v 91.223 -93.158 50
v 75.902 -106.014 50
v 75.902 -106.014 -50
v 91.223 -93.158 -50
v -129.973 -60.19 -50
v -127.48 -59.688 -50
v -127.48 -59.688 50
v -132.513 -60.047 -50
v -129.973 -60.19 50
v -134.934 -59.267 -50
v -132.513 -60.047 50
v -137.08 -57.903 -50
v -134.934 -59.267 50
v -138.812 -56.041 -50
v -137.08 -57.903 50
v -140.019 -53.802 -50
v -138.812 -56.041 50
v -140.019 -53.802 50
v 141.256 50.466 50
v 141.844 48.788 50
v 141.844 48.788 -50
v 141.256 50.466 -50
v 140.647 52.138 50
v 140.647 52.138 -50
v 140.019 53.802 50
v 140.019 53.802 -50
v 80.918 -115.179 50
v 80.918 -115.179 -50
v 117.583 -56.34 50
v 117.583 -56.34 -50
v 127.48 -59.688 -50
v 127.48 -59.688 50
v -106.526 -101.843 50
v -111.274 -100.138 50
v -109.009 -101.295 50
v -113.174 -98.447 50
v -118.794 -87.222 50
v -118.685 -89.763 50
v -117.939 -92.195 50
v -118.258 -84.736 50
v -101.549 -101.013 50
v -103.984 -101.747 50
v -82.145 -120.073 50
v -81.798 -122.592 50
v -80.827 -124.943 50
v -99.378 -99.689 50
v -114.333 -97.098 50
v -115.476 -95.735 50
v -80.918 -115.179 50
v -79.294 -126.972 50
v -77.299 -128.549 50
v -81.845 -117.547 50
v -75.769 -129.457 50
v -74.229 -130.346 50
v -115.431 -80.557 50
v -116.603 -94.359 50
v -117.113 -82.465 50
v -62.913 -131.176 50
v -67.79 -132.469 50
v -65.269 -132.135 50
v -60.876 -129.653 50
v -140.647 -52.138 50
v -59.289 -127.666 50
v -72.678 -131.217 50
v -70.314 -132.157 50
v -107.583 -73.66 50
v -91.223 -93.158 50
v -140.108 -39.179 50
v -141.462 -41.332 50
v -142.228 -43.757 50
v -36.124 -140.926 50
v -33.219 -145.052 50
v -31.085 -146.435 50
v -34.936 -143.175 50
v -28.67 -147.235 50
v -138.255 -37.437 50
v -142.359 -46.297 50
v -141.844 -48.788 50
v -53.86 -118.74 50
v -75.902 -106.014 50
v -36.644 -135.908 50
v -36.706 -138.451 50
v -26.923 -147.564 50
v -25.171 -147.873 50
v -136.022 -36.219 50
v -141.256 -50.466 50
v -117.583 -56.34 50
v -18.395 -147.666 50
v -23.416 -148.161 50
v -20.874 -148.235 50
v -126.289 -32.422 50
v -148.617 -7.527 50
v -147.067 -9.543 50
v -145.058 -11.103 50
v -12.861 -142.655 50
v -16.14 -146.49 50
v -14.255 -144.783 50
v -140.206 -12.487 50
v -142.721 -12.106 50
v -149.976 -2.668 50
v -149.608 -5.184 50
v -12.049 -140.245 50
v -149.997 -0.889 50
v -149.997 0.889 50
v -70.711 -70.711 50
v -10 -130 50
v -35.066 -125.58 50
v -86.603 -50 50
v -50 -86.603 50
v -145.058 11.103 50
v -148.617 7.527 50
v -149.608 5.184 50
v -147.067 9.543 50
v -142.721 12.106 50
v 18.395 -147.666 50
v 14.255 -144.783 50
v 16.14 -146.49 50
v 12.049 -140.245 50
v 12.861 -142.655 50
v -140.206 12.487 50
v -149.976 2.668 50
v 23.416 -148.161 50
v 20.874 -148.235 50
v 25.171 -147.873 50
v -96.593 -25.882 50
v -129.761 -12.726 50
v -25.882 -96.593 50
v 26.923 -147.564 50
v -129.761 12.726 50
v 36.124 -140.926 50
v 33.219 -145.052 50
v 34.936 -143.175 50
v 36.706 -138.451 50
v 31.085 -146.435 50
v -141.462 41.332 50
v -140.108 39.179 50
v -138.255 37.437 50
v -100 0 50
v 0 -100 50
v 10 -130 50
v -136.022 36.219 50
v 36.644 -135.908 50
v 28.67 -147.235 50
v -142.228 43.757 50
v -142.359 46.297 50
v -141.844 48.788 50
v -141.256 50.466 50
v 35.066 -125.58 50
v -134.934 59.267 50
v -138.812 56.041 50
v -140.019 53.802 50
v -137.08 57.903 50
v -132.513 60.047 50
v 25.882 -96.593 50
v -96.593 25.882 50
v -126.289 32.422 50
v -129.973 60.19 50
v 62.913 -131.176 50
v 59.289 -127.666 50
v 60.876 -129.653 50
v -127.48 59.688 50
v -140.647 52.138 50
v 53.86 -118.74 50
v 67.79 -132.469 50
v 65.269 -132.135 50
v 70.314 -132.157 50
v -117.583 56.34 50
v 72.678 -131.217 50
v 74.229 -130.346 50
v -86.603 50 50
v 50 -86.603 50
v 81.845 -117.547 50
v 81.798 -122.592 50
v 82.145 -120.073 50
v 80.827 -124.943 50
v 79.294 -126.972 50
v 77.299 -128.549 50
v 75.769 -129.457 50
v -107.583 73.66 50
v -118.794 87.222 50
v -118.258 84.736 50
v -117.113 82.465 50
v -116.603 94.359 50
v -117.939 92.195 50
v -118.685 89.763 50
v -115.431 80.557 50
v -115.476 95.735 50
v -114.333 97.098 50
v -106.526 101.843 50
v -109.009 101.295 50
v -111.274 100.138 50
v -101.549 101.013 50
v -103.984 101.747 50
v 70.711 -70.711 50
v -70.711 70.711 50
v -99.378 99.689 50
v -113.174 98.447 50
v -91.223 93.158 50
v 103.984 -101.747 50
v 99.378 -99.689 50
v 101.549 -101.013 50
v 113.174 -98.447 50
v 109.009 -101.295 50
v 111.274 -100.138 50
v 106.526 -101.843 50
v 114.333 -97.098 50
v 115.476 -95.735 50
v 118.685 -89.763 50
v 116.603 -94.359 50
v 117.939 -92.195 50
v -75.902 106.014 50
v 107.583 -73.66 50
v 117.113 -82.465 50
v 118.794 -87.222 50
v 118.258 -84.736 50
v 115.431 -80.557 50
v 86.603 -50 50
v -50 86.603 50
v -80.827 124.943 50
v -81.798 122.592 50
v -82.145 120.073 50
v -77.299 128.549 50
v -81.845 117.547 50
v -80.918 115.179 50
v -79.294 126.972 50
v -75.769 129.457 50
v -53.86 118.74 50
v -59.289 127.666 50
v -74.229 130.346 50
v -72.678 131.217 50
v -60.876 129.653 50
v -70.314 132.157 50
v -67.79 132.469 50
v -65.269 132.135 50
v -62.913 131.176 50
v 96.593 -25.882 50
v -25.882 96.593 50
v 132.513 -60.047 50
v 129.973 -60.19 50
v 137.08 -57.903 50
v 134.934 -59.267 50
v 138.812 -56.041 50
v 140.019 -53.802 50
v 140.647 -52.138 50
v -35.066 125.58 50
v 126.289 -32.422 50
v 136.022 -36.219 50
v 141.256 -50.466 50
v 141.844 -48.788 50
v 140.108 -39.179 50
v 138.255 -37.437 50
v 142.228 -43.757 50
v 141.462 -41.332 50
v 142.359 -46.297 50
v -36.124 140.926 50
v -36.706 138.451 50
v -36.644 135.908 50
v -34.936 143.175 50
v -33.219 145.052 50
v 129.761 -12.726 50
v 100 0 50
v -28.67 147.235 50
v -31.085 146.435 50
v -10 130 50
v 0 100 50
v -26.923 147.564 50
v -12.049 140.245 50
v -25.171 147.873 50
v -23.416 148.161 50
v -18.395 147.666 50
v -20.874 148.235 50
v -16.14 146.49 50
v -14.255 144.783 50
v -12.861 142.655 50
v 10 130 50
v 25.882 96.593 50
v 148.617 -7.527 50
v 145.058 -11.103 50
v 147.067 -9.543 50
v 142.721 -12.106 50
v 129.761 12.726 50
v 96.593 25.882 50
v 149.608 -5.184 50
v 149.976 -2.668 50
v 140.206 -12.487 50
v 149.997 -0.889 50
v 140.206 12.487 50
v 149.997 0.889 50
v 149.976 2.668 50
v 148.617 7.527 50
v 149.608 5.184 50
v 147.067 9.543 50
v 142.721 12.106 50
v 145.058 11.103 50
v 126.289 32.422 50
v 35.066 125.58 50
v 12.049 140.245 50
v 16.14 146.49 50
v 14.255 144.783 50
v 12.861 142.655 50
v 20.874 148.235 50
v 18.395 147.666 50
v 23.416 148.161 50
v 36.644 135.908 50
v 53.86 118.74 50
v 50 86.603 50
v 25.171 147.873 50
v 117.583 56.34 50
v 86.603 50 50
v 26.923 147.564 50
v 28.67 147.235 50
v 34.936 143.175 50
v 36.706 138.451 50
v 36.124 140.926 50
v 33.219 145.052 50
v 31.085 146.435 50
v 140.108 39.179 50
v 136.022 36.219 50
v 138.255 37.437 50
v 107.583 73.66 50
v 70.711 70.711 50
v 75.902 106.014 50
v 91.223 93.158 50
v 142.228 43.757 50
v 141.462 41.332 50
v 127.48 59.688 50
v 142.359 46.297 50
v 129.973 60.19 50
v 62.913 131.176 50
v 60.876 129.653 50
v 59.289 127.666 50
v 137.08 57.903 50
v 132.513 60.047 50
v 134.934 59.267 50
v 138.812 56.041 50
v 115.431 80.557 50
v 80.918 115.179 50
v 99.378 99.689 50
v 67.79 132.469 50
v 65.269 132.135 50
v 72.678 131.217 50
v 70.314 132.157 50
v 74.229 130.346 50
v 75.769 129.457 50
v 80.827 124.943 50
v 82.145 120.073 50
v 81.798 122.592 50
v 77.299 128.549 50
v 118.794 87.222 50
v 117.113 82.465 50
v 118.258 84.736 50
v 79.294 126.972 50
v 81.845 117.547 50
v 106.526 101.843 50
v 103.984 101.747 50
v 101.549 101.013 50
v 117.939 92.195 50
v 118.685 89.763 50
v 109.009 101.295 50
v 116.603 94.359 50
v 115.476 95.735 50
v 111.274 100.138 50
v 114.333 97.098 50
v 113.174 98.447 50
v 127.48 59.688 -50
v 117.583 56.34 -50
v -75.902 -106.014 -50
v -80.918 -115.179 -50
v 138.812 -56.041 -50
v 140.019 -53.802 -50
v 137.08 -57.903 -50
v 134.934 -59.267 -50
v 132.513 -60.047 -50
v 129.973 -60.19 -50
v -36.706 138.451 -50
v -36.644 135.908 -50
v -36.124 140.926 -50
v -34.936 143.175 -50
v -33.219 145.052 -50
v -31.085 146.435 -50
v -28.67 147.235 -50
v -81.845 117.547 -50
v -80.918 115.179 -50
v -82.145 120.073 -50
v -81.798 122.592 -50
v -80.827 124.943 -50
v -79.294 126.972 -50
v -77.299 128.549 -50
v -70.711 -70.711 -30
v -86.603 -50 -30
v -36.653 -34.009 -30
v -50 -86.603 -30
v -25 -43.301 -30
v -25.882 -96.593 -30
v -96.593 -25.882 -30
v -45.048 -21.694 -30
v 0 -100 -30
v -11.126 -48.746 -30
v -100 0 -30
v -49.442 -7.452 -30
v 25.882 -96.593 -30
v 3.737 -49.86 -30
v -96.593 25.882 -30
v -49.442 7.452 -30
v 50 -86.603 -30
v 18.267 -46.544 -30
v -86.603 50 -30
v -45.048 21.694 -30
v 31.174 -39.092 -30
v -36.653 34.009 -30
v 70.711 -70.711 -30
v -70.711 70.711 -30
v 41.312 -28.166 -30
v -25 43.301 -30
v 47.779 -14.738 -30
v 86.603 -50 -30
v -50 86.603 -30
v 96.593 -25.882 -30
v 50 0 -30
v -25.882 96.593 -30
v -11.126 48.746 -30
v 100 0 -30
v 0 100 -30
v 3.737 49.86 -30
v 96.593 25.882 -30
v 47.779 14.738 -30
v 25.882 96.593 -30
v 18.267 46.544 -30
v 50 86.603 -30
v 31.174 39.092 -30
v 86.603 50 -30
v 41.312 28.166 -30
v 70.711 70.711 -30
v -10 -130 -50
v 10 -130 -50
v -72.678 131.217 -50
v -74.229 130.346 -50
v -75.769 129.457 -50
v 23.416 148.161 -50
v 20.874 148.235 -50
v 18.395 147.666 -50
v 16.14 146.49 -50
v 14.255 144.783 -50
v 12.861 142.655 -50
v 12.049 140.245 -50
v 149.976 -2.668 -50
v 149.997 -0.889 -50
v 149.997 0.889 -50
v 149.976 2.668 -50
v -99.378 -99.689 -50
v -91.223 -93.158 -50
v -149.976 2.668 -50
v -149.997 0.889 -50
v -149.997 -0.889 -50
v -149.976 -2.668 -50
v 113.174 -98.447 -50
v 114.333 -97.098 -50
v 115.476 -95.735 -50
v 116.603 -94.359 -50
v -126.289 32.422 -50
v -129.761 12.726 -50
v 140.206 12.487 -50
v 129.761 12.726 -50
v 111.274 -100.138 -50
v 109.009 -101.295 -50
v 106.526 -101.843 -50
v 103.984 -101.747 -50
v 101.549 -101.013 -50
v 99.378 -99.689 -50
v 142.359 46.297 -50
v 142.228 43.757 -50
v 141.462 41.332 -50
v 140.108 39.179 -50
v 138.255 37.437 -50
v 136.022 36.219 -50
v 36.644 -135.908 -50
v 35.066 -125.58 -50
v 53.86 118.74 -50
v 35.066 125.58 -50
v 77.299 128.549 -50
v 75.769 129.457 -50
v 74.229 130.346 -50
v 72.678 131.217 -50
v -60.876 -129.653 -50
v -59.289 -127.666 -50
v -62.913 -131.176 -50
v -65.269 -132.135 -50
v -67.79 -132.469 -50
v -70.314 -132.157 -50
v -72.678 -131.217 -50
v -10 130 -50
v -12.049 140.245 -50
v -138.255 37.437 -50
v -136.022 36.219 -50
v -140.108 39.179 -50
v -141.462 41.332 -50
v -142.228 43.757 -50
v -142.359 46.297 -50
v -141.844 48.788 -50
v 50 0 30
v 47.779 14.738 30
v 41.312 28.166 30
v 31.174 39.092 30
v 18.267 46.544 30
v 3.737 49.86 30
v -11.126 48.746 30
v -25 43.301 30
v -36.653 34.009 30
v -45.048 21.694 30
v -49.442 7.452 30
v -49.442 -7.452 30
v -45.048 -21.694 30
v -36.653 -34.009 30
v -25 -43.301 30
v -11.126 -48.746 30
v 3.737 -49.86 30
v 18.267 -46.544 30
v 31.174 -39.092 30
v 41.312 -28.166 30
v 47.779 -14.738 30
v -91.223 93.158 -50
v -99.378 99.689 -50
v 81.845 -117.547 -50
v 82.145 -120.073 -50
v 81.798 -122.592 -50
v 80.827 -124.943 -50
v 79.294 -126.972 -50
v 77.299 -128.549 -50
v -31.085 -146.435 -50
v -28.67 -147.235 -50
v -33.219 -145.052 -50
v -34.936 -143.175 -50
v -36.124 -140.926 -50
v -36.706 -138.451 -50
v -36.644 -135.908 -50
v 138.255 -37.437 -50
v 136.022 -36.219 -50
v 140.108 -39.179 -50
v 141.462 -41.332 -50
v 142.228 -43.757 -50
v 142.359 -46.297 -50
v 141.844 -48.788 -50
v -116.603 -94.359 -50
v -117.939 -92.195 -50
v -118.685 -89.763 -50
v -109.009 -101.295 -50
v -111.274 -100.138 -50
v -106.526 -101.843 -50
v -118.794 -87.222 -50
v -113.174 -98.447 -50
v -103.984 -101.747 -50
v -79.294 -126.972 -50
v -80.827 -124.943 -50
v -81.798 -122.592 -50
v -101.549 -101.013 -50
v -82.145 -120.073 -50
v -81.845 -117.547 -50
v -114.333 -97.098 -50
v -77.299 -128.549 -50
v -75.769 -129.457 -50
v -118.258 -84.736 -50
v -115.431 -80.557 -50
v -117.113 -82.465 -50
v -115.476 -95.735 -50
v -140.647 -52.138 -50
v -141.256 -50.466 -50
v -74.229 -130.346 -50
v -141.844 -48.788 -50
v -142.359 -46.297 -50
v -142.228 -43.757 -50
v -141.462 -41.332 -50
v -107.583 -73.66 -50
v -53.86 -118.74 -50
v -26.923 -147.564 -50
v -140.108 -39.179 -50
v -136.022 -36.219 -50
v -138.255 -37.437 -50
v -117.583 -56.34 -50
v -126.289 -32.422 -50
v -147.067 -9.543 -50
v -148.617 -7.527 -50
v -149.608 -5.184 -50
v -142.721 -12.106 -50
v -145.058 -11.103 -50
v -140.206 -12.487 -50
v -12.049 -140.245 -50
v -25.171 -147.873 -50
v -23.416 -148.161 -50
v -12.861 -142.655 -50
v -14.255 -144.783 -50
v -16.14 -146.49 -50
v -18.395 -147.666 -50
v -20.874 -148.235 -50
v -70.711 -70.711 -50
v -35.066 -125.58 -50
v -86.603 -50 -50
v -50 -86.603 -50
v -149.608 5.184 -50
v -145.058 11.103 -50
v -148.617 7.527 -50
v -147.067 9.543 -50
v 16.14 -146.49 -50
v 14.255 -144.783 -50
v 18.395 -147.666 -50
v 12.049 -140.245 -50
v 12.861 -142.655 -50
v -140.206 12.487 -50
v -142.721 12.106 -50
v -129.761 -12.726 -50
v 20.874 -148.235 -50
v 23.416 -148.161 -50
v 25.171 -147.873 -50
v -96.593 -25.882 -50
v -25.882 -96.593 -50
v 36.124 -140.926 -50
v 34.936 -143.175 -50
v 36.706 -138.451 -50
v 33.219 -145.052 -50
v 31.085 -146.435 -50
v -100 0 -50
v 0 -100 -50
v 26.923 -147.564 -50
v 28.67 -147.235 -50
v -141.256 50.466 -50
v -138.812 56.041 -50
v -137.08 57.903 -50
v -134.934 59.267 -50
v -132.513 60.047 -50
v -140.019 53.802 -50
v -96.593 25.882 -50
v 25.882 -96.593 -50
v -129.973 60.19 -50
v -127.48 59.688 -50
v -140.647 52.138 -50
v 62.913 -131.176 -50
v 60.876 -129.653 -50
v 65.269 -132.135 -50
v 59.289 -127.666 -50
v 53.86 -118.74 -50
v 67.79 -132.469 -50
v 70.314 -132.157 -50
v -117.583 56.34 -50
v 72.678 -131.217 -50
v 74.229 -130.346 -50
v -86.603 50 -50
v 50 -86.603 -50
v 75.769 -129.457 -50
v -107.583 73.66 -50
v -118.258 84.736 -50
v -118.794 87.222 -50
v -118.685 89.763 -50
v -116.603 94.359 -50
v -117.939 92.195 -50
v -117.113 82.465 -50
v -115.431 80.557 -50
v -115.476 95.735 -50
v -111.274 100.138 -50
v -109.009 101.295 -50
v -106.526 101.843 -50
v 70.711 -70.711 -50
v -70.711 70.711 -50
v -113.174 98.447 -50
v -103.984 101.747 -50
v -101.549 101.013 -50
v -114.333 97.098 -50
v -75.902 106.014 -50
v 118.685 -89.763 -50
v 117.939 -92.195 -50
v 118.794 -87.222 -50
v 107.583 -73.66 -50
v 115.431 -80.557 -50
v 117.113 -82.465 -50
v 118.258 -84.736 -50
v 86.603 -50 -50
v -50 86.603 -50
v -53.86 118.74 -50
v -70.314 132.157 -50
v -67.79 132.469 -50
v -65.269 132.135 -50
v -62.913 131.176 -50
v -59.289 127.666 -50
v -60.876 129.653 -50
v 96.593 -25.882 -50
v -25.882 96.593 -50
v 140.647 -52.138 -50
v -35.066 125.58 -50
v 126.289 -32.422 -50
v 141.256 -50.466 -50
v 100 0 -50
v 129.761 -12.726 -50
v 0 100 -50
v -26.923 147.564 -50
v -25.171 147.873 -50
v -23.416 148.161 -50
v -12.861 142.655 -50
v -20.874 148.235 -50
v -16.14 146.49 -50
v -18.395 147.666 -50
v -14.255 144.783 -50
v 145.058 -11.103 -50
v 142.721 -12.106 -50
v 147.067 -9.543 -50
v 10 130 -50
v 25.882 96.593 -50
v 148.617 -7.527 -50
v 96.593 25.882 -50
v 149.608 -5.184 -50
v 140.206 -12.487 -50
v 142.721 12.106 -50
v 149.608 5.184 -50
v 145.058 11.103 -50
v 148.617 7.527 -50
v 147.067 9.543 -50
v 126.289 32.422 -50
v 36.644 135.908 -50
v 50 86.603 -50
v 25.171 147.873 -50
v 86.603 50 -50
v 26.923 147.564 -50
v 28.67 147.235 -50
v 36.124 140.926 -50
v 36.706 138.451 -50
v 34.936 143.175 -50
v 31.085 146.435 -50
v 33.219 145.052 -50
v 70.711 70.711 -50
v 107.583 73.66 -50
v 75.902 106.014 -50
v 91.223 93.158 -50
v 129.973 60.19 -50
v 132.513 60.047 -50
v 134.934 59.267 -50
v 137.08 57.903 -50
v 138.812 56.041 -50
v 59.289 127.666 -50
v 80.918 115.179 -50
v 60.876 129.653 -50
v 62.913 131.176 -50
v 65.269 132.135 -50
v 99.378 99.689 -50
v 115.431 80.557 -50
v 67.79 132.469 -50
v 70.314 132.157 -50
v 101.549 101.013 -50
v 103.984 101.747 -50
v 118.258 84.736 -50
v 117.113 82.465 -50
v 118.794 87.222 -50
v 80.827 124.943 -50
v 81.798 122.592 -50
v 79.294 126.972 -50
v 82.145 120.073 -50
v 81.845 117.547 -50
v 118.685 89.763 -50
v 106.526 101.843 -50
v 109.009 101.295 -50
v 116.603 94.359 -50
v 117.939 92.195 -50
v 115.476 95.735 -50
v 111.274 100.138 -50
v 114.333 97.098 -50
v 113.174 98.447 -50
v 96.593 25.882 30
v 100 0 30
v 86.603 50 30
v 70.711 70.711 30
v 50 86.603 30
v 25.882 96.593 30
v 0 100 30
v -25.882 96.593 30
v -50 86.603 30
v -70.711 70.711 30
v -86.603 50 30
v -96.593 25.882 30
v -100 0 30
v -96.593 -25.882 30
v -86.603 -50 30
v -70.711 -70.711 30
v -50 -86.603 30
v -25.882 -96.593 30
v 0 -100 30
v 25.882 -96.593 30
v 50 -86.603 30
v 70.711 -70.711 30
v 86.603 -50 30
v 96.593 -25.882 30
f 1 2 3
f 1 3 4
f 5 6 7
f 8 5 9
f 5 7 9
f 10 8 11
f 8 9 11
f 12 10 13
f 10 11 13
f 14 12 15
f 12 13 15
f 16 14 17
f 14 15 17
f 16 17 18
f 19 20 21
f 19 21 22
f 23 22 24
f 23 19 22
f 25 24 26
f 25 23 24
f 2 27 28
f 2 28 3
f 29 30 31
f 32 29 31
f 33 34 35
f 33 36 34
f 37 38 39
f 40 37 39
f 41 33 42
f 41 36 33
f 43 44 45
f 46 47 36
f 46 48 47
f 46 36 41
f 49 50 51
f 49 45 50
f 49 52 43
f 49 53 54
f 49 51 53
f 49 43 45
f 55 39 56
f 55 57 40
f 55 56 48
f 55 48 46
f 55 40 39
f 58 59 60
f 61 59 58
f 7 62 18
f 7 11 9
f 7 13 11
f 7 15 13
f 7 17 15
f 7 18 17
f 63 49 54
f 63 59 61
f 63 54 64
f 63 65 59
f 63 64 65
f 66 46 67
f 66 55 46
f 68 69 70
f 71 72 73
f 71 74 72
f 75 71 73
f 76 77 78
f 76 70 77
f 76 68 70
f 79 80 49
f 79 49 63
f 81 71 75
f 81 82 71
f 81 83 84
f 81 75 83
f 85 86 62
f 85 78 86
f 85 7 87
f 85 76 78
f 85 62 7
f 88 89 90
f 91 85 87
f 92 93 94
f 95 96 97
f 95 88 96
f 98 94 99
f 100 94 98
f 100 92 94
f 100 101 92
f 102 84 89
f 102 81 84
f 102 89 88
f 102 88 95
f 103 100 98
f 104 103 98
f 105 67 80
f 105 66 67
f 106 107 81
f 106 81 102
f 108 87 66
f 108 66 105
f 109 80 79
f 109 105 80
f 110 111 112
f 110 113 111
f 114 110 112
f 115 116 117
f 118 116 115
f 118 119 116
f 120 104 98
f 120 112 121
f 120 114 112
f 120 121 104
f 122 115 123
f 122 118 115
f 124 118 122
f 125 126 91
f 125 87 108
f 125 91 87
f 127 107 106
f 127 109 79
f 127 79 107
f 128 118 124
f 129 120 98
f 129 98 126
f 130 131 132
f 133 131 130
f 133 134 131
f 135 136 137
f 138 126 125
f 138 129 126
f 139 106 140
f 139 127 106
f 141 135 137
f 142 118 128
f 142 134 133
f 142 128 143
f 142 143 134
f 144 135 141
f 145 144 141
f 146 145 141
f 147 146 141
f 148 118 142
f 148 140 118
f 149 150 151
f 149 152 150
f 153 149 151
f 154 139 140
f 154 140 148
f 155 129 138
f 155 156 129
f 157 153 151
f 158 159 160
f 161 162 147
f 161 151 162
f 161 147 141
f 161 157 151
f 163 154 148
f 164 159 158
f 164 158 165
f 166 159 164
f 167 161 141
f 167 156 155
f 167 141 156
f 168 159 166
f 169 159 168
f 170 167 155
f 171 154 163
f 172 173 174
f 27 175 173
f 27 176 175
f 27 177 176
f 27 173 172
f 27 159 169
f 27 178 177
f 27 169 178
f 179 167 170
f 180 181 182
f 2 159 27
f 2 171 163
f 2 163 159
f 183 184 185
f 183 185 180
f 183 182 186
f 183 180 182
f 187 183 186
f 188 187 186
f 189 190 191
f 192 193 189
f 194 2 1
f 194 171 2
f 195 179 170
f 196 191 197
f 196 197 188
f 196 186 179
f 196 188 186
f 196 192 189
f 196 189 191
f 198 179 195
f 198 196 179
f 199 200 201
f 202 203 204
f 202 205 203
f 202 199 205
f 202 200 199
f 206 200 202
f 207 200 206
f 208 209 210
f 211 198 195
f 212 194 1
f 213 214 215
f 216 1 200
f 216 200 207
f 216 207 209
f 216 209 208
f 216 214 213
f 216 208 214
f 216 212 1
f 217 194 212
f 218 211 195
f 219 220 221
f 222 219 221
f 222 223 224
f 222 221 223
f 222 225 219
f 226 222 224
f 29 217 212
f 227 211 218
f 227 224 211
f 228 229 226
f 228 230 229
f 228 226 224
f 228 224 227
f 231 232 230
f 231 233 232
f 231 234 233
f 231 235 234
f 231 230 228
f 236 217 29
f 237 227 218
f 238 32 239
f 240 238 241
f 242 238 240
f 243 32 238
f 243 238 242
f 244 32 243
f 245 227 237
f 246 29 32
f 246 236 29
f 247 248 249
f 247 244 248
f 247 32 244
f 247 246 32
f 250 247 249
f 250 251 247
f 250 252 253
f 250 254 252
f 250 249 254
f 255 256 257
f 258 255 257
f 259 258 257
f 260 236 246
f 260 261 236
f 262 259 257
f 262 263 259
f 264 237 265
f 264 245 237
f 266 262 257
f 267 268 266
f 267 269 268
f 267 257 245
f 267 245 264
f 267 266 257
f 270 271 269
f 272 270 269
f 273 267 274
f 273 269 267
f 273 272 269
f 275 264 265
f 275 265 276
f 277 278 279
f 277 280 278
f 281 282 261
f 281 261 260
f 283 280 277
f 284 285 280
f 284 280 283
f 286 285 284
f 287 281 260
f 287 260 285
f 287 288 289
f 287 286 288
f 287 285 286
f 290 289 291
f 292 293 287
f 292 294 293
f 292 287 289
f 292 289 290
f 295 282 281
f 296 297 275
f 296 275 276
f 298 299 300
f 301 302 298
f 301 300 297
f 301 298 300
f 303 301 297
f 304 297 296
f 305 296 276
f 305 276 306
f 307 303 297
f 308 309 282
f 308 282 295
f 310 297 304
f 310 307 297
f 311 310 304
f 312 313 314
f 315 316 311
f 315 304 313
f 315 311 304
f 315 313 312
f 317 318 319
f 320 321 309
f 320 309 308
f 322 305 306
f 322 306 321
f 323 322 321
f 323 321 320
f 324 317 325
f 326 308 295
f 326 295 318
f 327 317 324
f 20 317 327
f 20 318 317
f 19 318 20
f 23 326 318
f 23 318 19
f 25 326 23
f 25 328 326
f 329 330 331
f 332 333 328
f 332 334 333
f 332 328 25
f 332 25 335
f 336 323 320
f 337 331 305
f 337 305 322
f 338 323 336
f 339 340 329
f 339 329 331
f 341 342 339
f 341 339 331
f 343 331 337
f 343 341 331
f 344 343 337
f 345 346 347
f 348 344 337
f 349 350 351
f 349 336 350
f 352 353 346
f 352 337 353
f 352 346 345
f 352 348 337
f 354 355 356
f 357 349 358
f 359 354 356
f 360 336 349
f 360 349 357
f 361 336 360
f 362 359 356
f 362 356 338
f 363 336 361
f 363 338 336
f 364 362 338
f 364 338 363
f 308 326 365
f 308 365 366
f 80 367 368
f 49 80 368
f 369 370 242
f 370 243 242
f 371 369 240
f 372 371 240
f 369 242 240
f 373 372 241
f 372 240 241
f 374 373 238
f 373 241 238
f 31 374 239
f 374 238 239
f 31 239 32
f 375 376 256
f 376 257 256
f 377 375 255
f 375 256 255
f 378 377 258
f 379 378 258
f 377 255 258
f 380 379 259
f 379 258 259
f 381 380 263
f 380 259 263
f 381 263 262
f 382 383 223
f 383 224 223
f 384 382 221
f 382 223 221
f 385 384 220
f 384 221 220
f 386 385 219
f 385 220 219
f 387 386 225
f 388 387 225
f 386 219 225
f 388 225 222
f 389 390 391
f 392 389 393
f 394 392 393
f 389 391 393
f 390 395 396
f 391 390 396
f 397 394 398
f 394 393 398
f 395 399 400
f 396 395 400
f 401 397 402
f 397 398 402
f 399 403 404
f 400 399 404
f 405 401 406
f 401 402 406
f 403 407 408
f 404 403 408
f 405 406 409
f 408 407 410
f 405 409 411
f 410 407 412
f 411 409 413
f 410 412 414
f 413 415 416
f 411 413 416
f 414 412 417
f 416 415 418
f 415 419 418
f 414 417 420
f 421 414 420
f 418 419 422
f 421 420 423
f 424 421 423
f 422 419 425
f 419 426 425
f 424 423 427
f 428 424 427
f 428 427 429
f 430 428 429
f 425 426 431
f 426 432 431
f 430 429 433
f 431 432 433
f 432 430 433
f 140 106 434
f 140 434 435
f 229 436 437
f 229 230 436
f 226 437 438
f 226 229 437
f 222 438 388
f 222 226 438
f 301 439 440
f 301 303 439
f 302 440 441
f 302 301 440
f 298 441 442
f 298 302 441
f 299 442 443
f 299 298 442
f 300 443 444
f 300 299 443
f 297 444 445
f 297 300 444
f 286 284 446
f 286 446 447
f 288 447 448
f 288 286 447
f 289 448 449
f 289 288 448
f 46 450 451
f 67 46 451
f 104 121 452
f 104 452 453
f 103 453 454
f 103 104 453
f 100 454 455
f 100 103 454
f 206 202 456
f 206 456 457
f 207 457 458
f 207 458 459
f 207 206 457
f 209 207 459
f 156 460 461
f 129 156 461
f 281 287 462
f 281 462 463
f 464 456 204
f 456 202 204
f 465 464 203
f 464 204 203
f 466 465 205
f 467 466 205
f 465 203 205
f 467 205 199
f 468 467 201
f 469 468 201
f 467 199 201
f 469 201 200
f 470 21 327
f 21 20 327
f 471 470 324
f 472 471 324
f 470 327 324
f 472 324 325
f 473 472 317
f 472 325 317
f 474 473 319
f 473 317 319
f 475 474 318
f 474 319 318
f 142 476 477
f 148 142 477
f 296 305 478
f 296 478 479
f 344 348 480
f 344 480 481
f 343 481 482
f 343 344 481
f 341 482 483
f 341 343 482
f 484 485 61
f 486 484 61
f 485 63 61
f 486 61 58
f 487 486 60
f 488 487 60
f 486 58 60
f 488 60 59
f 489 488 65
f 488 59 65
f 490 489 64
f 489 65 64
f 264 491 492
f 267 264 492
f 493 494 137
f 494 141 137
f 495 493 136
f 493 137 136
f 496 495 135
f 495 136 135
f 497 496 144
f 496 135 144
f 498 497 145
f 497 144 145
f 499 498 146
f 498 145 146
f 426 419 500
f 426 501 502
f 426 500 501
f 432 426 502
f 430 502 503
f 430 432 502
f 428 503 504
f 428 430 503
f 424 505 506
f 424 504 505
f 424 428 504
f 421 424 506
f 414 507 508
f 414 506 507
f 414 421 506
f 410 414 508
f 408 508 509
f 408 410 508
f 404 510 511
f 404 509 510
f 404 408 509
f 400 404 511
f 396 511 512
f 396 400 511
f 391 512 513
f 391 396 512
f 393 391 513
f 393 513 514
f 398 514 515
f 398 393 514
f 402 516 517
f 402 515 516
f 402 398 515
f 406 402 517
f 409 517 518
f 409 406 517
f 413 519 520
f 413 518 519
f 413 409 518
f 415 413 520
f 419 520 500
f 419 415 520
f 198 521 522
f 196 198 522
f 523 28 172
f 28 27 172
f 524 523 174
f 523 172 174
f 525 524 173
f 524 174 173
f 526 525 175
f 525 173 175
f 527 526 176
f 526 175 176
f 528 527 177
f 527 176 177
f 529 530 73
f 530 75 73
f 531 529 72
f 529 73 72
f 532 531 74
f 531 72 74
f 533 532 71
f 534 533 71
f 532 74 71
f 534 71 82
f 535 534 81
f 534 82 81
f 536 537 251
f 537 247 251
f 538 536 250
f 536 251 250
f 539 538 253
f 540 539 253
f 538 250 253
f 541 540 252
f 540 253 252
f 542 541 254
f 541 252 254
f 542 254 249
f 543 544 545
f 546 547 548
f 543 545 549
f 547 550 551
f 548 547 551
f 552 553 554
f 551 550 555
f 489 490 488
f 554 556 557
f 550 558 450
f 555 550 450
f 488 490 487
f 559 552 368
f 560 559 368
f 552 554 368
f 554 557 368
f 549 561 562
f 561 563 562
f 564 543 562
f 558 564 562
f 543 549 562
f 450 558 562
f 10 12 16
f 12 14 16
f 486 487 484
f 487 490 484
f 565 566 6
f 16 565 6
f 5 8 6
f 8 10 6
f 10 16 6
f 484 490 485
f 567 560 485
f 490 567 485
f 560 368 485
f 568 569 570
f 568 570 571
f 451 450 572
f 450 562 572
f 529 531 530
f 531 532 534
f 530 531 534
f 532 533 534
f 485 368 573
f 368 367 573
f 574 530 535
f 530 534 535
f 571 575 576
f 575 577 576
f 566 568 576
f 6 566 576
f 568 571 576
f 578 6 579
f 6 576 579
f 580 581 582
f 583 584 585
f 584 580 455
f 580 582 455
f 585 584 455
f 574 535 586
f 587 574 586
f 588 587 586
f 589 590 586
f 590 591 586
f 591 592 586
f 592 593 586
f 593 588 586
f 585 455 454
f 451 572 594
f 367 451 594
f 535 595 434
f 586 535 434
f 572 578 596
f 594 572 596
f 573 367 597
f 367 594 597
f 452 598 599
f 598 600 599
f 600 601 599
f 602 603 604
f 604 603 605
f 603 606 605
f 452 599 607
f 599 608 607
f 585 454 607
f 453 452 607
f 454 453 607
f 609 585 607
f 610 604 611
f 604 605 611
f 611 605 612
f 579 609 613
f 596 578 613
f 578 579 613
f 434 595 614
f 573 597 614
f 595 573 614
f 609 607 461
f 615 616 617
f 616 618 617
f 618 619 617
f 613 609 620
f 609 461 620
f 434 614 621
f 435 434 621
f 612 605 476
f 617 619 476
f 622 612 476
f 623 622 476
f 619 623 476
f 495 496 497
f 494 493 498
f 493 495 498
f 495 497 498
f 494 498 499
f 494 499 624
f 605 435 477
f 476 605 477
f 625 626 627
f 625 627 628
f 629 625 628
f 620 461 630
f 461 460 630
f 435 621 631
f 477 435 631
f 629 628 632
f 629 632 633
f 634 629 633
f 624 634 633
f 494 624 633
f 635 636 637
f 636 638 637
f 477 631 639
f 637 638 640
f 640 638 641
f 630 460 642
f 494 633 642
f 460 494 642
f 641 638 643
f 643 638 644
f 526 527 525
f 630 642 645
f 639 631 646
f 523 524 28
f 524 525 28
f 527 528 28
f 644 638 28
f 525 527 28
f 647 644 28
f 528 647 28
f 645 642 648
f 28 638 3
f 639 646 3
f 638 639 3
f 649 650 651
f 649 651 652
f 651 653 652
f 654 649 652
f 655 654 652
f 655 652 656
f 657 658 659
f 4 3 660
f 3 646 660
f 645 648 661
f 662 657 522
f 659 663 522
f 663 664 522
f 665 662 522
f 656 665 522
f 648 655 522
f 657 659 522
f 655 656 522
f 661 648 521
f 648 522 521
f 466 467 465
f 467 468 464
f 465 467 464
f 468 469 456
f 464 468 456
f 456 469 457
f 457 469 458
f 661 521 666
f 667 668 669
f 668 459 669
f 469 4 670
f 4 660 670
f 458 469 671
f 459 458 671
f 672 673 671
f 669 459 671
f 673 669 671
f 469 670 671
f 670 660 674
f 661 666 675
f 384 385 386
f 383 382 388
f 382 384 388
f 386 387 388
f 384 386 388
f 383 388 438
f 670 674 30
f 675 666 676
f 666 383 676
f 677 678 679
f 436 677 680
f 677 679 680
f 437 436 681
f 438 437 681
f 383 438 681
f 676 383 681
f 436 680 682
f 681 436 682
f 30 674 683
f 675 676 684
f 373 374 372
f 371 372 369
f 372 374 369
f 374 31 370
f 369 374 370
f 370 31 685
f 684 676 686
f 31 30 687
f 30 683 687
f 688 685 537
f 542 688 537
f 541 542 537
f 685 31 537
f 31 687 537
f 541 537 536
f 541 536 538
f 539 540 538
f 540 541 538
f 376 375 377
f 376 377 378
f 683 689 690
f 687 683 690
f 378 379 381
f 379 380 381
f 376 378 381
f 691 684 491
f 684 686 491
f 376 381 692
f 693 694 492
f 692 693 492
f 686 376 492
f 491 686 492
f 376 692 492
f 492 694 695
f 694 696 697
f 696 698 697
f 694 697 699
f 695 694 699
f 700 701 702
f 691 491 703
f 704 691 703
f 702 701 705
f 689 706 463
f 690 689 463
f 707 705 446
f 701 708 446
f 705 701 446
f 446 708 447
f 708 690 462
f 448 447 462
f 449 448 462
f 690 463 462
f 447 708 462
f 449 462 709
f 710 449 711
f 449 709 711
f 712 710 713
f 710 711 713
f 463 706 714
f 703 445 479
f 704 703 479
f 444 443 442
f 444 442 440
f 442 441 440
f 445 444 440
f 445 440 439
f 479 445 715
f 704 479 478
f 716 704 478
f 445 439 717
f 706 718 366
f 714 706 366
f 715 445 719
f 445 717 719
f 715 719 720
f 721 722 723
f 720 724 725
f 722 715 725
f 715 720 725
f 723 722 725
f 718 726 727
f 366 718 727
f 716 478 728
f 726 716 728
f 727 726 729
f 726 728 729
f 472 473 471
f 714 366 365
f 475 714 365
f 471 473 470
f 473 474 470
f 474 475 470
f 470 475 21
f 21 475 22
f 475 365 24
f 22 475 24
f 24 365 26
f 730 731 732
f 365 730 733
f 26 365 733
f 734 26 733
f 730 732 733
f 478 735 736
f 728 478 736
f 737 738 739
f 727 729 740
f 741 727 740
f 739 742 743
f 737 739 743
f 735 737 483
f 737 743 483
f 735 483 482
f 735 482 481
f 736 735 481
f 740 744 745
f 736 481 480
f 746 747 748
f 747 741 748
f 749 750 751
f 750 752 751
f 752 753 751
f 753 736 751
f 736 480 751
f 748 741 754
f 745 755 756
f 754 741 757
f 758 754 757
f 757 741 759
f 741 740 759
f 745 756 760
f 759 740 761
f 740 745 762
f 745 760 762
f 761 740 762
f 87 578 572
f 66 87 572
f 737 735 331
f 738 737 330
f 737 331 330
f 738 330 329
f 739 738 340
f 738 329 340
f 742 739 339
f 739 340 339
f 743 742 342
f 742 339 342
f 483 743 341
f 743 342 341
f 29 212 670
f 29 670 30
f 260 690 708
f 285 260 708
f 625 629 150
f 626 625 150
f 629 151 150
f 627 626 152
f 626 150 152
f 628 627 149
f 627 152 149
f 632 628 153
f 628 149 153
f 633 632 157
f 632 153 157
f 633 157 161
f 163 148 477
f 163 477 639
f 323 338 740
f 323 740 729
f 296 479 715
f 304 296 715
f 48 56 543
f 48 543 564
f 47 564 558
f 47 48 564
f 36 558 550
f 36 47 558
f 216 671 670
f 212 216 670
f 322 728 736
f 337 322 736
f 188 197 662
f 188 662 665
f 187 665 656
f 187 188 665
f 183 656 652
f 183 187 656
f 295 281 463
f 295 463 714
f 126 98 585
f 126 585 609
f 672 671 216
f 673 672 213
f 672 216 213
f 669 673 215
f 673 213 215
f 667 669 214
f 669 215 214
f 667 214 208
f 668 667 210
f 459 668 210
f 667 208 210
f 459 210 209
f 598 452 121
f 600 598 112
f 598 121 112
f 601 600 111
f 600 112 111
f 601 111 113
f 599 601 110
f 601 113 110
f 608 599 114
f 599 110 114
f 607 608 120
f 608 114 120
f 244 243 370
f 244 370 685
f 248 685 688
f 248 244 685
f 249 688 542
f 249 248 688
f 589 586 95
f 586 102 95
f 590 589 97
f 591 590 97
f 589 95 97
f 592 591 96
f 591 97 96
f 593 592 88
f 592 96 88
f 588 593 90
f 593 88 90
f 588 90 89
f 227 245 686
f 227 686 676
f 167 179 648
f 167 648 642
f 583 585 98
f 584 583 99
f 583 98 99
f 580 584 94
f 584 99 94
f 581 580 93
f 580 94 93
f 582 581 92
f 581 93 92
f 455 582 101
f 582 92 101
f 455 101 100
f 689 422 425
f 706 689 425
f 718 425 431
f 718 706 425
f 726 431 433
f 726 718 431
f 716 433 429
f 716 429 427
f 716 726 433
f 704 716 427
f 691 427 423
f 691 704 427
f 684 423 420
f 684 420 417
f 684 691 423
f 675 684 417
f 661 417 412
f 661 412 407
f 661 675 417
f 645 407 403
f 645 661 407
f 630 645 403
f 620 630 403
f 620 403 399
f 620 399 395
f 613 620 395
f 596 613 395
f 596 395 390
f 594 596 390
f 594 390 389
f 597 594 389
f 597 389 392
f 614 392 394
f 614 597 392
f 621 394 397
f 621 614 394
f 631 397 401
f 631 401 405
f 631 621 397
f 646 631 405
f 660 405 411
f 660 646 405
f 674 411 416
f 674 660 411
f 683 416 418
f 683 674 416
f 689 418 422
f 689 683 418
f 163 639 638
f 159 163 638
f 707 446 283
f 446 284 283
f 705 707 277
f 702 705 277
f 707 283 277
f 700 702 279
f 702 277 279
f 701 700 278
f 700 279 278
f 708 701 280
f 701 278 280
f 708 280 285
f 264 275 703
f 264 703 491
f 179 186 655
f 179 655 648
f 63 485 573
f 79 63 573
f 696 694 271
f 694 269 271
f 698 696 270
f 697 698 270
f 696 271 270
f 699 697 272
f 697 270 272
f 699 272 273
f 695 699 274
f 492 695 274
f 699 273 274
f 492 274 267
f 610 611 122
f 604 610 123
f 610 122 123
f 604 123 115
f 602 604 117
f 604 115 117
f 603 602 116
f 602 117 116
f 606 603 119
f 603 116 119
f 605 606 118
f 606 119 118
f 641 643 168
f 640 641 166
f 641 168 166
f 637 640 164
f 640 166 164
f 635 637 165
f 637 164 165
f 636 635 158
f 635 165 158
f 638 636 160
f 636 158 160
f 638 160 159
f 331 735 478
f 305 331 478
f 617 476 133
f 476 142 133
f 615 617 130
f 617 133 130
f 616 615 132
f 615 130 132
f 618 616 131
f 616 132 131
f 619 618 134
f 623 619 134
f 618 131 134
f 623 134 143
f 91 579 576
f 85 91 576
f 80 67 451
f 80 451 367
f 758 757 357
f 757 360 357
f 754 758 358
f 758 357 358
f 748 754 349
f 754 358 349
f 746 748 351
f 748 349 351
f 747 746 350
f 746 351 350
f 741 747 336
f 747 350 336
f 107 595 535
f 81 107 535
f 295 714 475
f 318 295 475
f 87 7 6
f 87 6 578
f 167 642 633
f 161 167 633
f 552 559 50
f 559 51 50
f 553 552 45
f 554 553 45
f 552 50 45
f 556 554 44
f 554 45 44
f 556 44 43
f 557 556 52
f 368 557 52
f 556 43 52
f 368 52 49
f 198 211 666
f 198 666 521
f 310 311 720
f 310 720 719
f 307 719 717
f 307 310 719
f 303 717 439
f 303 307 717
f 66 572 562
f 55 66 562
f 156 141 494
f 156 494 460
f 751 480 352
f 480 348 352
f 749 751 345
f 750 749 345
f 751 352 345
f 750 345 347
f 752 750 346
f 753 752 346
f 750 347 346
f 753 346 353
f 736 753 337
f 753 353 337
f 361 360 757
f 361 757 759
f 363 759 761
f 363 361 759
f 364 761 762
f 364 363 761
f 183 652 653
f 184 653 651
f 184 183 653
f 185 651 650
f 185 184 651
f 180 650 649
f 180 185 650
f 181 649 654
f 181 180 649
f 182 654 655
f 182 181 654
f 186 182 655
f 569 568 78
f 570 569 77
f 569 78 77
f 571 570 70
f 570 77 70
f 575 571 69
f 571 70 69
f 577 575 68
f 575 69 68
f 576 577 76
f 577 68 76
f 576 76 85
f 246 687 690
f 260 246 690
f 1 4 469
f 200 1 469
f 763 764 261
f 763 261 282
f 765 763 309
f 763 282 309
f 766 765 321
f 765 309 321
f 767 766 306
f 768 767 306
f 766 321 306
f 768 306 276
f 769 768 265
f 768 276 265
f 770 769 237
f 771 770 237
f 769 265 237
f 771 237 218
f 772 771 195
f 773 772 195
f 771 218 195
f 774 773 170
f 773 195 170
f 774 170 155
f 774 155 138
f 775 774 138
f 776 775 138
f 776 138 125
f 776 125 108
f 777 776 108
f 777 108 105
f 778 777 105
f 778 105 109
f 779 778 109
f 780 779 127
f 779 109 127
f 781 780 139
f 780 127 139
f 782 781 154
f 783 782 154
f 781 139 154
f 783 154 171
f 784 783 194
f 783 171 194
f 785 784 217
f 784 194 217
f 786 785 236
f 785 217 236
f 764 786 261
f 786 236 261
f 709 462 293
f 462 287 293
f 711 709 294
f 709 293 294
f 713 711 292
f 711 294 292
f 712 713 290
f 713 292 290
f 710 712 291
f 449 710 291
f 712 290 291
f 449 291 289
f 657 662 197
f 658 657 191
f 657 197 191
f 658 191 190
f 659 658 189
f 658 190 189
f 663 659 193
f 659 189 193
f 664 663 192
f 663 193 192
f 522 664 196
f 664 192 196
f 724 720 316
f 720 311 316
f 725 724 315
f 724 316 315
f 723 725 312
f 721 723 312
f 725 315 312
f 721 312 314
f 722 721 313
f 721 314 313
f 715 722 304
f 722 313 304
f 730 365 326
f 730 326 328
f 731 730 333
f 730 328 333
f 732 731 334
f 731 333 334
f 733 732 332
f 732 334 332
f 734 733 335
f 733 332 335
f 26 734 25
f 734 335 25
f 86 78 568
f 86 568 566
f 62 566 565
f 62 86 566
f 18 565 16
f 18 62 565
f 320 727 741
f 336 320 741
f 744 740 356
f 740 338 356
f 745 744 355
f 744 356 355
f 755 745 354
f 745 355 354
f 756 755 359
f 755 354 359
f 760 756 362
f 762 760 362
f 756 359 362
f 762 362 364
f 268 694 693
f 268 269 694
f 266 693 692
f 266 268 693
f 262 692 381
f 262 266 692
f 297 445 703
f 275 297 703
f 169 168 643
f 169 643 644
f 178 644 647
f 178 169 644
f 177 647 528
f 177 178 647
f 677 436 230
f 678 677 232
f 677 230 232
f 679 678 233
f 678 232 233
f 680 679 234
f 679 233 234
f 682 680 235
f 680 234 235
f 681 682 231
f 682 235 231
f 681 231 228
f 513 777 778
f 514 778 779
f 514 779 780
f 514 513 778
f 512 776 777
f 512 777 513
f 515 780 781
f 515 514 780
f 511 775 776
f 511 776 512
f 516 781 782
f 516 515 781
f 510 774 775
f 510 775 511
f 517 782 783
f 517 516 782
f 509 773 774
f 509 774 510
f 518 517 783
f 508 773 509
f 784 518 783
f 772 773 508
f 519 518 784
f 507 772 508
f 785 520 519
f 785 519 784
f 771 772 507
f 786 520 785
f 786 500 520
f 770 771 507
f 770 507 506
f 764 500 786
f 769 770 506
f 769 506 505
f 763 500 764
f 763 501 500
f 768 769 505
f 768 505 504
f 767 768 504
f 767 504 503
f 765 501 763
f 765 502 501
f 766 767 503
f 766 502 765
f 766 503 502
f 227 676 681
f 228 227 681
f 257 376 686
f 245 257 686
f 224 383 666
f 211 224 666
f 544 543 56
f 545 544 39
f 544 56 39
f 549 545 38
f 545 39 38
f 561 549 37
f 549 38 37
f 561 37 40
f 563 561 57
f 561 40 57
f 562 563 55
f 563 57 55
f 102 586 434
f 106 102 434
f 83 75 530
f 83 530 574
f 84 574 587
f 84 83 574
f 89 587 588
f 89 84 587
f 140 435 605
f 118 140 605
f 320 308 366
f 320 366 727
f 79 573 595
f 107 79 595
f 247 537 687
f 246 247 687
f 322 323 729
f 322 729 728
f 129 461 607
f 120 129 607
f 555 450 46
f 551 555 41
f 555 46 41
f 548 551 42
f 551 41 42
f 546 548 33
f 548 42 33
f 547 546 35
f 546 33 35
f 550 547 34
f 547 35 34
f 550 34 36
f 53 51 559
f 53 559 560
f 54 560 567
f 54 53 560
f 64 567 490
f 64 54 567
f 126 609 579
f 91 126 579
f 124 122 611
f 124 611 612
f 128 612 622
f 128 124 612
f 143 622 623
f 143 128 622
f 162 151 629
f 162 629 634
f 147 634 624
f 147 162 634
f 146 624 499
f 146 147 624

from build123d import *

# Parameters (mm, degrees)
SKETCH2_R                = 150
SKETCH2_R_2              = 50
BOSS_EXTRUDE1_DEPTH      = 50
CUT_EXTRUDE1_DEPTH       = 235.520787991
FILLET1_R                = 10
CIRPATTERN1_COUNT        = 18
FILLET1_OF_CIRPATTERN1_R = 10
SKETCH6_R                = 100
CUT_EXTRUDE2_DEPTH       = 20


with BuildPart() as part:
    # Sketch2 → Boss-Extrude1 (new, symmetric)
    with BuildSketch(Plane.XY):
        Circle(SKETCH2_R)
        Circle(SKETCH2_R_2, mode=Mode.SUBTRACT)
    extrude(amount=BOSS_EXTRUDE1_DEPTH, both=True)

    # Sketch5 → Cut-Extrude1 (cut, through all)
    with BuildSketch(Plane.XY.offset(50)):
        Polygon((-20, 180), (20, 180), (10, 130), (-10, 130), align=None)
    cut_extrude1 = extrude(amount=-CUT_EXTRUDE1_DEPTH, mode=Mode.SUBTRACT)

    # Fillet1
    fillet1_edges = [part.edges().sort_by_distance(p)[0] for p in [
        (13.871446547, 149.357232736, 0),
        (-13.871446547, 149.357232736, 0),
    ]]
    fillet(fillet1_edges, radius=FILLET1_R)

    # CirPattern1: Cut-Extrude1 ×18 about axis
    cirpattern1_axis = Axis((0, 0, 0), (0, 0, 1))
    for i in range(1, CIRPATTERN1_COUNT):
        add(cut_extrude1.rotate(cirpattern1_axis, i * 360 / CIRPATTERN1_COUNT), mode=Mode.SUBTRACT)

    # Fillet1 of CirPattern1
    fillet1_of_cirpattern1_edges = [part.edges().sort_by_distance(p)[0] for p in [
        (-38.048286187, 145.0942036, 0),
        (-64.118078107, 135.605575327, 0),
        (-85.378834074, 123.330672146, 0),
        (-106.631123166, 105.497884208, 0),
        (-122.411434515, 86.691641465, 0),
        (-136.282881062, 62.665591271, 0),
        (-144.679409353, 39.596319391, 0),
        (-149.496912182, 12.274903181, 0),
        (-149.496912182, -12.274903181, 0),
        (-144.679409353, -39.596319391, 0),
        (-136.282881062, -62.665591271, 0),
        (-122.411434515, -86.691641465, 0),
        (-106.631123166, -105.497884208, 0),
        (-85.378834074, -123.330672146, 0),
        (-64.118078107, -135.605575327, 0),
        (-38.048286187, -145.0942036, 0),
        (-13.871446547, -149.357232736, 0),
        (13.871446547, -149.357232736, 0),
        (38.048286187, -145.0942036, 0),
        (64.118078107, -135.605575327, 0),
        (85.378834074, -123.330672146, 0),
        (106.631123166, -105.497884208, 0),
        (122.411434515, -86.691641465, 0),
        (136.282881062, -62.665591271, 0),
        (144.679409353, -39.596319391, 0),
        (149.496912182, -12.274903181, 0),
        (149.496912182, 12.274903181, 0),
        (144.679409353, 39.596319391, 0),
        (136.282881062, 62.665591271, 0),
        (122.411434515, 86.691641465, 0),
        (106.631123166, 105.497884208, 0),
        (85.378834074, 123.330672146, 0),
        (64.118078107, 135.605575327, 0),
        (38.048286187, 145.0942036, 0),
    ]]
    fillet(fillet1_of_cirpattern1_edges, radius=FILLET1_OF_CIRPATTERN1_R)

    # Sketch6 → Cut-Extrude2 (cut)
    with BuildSketch(Plane.XY.offset(50)):
        Circle(SKETCH6_R)
    cut_extrude2 = extrude(amount=-CUT_EXTRUDE2_DEPTH, mode=Mode.SUBTRACT)

    # Mirror1: Cut-Extrude2 across plane
    add(cut_extrude2.mirror(Plane.XY), mode=Mode.SUBTRACT)


solid = part.part
